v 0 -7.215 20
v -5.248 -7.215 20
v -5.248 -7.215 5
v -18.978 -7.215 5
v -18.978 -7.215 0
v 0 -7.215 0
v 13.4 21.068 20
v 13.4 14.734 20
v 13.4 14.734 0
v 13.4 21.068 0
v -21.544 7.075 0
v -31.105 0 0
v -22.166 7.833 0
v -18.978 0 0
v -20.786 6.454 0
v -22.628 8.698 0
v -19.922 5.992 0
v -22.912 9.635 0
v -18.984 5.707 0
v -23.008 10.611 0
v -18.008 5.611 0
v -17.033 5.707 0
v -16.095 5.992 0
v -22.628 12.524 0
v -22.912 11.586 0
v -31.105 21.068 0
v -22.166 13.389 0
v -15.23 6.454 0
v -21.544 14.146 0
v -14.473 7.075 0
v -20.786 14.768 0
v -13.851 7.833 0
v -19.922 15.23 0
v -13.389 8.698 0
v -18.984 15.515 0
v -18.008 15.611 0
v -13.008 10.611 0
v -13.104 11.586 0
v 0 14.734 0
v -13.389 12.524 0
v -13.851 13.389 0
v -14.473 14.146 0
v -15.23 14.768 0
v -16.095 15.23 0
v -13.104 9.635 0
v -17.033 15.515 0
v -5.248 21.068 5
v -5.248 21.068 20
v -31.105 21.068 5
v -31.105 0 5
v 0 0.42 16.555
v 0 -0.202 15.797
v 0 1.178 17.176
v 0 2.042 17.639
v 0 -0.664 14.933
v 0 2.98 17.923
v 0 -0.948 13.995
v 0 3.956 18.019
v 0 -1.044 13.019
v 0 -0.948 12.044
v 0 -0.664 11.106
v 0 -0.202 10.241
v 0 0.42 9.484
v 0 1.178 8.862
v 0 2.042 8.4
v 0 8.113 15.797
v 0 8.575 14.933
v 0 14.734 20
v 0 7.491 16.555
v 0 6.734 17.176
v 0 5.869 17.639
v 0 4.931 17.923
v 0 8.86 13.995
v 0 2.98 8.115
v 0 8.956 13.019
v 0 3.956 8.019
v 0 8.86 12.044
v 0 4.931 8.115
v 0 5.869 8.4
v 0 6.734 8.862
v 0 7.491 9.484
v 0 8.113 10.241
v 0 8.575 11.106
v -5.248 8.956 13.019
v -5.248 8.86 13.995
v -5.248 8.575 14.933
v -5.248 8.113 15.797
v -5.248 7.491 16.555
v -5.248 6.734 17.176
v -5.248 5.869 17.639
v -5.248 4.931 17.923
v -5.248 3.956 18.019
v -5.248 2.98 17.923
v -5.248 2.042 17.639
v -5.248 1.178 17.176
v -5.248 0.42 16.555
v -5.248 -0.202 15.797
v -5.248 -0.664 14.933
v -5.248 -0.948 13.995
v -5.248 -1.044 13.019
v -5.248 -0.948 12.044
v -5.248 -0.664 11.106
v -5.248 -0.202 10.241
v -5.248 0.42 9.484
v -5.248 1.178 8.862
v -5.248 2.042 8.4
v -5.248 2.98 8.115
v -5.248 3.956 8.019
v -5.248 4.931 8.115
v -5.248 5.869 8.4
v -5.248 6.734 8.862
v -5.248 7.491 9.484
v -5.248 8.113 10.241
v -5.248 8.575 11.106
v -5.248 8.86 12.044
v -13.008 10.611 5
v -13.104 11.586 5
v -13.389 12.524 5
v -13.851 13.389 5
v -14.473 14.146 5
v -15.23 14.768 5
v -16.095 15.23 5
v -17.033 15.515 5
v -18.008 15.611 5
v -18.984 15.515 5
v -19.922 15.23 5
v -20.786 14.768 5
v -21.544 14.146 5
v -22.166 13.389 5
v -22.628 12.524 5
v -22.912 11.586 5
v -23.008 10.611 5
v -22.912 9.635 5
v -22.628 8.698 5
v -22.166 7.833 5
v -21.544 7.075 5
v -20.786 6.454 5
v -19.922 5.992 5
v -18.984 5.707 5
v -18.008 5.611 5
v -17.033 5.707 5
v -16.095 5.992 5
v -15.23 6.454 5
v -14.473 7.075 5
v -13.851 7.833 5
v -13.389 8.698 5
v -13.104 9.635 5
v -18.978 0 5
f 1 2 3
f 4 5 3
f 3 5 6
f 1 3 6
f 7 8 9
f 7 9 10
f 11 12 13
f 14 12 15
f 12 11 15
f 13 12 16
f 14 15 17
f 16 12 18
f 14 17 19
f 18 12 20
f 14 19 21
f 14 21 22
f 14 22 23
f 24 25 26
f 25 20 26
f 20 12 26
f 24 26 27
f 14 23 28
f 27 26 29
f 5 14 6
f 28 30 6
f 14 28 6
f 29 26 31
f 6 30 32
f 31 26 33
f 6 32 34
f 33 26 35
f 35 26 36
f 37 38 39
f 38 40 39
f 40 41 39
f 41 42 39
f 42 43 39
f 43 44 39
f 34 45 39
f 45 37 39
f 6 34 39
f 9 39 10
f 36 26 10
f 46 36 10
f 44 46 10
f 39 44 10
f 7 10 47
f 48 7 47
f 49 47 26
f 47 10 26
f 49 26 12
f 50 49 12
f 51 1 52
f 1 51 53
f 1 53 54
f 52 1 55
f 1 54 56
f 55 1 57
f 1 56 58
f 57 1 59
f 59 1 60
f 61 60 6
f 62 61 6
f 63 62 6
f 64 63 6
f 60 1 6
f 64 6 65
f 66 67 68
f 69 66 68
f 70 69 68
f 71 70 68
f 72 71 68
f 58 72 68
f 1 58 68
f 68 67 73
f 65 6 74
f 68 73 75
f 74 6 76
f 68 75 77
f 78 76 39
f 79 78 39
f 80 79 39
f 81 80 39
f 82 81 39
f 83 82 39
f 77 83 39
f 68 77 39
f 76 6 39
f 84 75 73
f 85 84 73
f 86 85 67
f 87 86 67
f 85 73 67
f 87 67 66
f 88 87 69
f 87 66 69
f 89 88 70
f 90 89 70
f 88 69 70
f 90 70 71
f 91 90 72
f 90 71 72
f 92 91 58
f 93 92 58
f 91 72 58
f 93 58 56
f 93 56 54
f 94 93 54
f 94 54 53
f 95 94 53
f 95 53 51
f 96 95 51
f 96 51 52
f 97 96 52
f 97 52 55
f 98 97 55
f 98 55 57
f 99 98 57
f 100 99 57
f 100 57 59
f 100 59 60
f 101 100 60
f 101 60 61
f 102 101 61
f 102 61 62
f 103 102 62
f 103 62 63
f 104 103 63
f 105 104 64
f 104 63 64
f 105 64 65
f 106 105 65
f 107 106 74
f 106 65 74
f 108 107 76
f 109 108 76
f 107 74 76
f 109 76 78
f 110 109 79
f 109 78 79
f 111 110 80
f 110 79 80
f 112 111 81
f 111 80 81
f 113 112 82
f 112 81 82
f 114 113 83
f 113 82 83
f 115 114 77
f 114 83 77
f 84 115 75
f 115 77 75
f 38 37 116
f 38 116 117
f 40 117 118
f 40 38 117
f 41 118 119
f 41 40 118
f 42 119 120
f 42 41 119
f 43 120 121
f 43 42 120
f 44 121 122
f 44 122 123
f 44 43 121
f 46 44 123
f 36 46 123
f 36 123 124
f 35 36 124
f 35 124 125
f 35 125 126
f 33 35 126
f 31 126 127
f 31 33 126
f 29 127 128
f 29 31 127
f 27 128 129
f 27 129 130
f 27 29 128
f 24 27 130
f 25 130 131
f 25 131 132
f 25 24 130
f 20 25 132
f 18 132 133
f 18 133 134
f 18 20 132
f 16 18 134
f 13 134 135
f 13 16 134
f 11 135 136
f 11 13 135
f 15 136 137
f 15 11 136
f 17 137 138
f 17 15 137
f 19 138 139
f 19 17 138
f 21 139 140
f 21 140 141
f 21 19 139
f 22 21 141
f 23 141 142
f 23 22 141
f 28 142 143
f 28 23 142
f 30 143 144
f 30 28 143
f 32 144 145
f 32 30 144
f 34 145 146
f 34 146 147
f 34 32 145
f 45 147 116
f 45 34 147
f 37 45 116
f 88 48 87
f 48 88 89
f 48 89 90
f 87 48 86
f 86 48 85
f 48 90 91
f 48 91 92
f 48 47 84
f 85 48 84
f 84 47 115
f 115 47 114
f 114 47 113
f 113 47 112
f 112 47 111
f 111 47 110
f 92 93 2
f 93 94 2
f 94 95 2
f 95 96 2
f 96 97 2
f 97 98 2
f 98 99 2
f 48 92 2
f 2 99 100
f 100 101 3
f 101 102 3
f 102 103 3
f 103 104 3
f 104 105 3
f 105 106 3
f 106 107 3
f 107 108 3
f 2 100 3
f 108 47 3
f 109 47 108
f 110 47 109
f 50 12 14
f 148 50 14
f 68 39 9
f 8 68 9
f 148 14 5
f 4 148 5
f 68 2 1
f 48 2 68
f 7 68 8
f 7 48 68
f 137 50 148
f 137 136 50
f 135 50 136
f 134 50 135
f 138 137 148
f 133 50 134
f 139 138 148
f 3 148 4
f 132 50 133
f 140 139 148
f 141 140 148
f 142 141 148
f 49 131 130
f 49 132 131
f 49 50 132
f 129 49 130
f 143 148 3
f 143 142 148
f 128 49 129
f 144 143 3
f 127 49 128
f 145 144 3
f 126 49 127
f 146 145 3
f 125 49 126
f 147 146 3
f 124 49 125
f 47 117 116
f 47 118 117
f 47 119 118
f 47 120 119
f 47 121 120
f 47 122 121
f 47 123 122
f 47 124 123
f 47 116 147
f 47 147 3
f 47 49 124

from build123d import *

# Parameters (mm, degrees)
F0_R     = 5
F1_DEPTH = 5
F2_DEPTH = 20
F3_R     = 5
F4_DEPTH = 25


with BuildPart() as f1:
    # F0 (on Top) → F1 (new body)
    with BuildSketch(Plane.XY):
        Polygon((-31.1052, 21.068258), (-31.1052, 0), (-18.978415, 0), (-18.978415, -7.215436), (-5.24761, -7.215436), (-5.24761, 21.068258), align=None)
        with Locations((-18.008273, 10.610935)):
            Circle(F0_R, mode=Mode.SUBTRACT)
    extrude(amount=F1_DEPTH)

    # F0 (on Top) → F2 (join)
    with BuildSketch(Plane.XY):
        Polygon((13.400096, 21.068258), (-5.24761, 21.068258), (-5.24761, -7.215436), (0, -7.215436), (0, 14.73404), (13.400096, 14.73404), align=None)
    extrude(amount=F2_DEPTH)

    # F3 (on Right) → F4 (cut)
    with BuildSketch(Plane.YZ):
        with Locations((3.955835, 13.019141)):
            Circle(F3_R)
    extrude(amount=-F4_DEPTH, mode=Mode.SUBTRACT)


solid = f1.part
